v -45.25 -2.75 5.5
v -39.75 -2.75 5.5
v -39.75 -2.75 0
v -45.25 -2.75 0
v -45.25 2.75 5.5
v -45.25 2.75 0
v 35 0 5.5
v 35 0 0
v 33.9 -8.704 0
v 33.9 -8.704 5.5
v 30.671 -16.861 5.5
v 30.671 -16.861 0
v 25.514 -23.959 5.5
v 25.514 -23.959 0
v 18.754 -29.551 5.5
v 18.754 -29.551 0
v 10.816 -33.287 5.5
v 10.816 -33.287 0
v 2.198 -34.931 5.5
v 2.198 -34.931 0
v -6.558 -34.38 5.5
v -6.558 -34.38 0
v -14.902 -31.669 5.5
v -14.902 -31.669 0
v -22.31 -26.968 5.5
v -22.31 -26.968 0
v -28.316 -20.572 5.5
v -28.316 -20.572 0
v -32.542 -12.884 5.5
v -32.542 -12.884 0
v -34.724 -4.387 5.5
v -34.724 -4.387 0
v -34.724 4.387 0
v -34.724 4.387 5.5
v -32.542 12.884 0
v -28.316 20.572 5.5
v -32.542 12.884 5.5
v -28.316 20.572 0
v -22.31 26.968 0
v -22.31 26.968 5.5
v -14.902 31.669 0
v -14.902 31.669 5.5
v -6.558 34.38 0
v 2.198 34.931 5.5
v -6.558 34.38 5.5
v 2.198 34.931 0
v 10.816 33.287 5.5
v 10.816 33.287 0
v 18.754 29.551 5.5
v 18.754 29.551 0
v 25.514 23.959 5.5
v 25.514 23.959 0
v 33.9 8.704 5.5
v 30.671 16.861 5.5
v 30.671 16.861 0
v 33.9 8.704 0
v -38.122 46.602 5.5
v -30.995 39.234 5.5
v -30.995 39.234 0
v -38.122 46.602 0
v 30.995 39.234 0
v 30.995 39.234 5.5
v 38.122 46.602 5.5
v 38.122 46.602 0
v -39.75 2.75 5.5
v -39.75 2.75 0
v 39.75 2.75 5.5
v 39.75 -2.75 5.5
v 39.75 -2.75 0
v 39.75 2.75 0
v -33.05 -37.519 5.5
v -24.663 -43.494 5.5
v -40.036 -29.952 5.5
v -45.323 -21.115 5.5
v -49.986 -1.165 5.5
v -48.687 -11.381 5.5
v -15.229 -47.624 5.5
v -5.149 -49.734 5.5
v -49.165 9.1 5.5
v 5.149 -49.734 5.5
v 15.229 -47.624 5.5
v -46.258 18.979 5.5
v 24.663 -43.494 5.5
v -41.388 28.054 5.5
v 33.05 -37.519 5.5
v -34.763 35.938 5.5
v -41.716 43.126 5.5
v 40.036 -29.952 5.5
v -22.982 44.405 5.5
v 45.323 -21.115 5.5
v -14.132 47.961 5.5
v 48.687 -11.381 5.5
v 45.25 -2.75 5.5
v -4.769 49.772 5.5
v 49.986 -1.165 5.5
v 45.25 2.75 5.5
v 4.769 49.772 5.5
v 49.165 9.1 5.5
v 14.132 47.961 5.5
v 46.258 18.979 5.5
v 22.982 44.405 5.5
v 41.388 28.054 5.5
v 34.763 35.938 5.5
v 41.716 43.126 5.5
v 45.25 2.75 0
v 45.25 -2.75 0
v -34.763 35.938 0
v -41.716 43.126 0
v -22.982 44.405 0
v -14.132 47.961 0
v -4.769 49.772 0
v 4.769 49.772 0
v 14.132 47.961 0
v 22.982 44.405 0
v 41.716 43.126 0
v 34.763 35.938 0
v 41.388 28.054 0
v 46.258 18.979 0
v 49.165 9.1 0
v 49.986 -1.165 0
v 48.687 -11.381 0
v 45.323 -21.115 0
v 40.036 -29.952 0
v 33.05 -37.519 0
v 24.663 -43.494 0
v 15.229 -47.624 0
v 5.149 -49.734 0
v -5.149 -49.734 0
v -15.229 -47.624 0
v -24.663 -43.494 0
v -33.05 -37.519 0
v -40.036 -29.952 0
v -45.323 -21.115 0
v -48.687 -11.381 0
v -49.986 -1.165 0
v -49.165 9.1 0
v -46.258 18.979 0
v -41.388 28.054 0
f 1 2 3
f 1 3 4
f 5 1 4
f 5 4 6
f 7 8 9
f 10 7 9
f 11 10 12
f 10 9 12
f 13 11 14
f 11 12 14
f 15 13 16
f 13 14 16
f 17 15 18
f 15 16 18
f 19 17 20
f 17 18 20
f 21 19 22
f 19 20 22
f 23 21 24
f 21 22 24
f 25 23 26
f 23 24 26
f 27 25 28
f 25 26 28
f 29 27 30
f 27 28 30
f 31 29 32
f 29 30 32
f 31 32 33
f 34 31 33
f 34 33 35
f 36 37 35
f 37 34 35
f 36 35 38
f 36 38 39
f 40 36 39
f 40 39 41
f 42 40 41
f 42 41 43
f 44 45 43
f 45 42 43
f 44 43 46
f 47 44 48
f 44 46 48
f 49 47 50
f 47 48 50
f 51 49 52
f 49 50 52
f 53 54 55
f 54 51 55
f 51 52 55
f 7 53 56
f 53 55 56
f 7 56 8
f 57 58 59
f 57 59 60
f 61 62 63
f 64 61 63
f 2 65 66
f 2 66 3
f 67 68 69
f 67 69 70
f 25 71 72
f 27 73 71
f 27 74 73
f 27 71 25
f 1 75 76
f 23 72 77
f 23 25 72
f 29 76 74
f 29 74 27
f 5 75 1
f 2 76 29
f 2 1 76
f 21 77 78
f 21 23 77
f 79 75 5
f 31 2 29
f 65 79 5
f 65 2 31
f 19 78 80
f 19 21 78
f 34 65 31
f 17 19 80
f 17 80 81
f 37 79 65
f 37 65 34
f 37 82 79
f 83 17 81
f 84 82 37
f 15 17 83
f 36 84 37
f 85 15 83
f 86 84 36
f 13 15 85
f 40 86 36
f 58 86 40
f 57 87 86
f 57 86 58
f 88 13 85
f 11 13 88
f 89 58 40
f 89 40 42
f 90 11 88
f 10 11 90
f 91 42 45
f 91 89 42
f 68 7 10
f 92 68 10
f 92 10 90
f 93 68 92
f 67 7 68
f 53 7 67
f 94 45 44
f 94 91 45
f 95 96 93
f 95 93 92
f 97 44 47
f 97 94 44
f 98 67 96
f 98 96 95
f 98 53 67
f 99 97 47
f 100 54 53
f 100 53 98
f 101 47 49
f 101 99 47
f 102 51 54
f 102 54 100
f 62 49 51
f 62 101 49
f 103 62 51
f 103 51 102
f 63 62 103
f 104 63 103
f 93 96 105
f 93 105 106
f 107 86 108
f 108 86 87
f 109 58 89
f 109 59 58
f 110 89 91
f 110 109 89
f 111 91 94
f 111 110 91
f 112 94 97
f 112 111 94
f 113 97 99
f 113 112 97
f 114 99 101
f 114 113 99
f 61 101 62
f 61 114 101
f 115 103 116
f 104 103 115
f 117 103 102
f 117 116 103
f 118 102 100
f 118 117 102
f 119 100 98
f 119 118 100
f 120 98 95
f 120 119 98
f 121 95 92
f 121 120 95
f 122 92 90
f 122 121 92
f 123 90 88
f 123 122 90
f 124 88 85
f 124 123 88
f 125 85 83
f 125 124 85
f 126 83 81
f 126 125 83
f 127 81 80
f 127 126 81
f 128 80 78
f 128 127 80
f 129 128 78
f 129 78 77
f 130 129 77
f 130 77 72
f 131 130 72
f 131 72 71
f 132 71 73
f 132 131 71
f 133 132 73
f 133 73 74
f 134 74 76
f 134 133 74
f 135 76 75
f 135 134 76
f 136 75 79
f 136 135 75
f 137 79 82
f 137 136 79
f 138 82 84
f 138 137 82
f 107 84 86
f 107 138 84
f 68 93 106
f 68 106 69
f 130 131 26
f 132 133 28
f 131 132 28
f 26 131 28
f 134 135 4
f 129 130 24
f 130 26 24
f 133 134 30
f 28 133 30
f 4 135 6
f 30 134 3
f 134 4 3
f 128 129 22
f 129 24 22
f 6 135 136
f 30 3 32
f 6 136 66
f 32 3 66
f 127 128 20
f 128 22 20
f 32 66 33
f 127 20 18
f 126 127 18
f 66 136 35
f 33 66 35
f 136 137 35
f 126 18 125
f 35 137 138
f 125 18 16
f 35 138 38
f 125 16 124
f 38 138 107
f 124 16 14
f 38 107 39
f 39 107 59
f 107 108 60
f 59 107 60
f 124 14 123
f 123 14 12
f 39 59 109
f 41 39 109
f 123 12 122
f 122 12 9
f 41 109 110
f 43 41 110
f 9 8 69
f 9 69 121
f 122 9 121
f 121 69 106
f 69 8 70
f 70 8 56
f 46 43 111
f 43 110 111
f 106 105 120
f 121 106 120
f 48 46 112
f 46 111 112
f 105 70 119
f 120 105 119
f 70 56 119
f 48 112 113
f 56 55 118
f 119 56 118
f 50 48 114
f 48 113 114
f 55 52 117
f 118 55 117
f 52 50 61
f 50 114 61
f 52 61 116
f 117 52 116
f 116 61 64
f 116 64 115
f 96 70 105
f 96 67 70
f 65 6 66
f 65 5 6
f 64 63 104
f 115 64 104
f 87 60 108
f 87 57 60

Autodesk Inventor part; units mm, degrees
ref_plane "YZ Plane" through (0, 0, 0) normal (1, 0, 0) x (0, 1, 0)
ref_plane "XZ Plane" through (0, 0, 0) normal (0, 1, 0) x (-1, 0, 0)
ref_plane "XY Plane" through (0, 0, 0) normal (0, 0, 1) x (1, 0, 0)
sketch "Sketch1" plane through (0, 0, 0) normal (0, 0, 1) x (1, 0, 0)
  circle A0 centre (0, 0) radius 50
  circle A1 centre (0, 0) radius 35
  dimension "d0" = 100
  dimension "d1" = 70
extrude "Extrusion1" add sketch "Sketch1" along normal blind 5.5
sketch "Sketch4" plane through (0, 0, 5.5) normal (0, 0, 1) x (1, 0, 0)
  line L0 (39.75, 2.75) -> (45.25, 2.75)
  line L1 (45.25, 2.75) -> (45.25, -2.75)
  line L2 (45.25, -2.75) -> (39.75, -2.75)
  line L3 (39.75, -2.75) -> (39.75, 2.75)
  line L4 (-39.75, -2.75) -> (-45.25, -2.75)
  line L5 (-45.25, -2.75) -> (-45.25, 2.75)
  line L6 (-45.25, 2.75) -> (-39.75, 2.75)
  line L7 (-39.75, 2.75) -> (-39.75, -2.75)
  point P0 (0, 0)
  dimension "d13" = 5.5
  dimension "d14" = 5.5
  dimension "d17" = 360
extrude "Extrusion3" cut sketch "Sketch4" against normal blind 10
sketch "Sketch5" plane through (0, 0, 5.5) normal (0, 0, 1) x (1, 0, 0)
  circle A0 centre (0, 0) radius 50 projected
  line L0 (34.763, 35.938) -> (41.7155, 43.1255)
  line L1 (30.9949, 39.2341) -> (38.1218, 46.6018)
  line L2 (38.1218, 46.6018) -> (41.7155, 43.1255)
  line L3 (-34.763, 35.938) -> (-41.7155, 43.1255)
  line L4 (-30.9949, 39.2341) -> (-38.1218, 46.6018)
  line L5 (-38.1218, 46.6018) -> (-41.7155, 43.1255)
  arc A1 (-34.763, 35.938) -> (-30.9949, 39.2341) centre (-33.5607, 38.3654) ccw
  arc A2 (30.9949, 39.2341) -> (34.763, 35.938) centre (32.7963, 37.4916) ccw
  dimension "d21" = 10
  dimension "d22" = 5
extrude "Extrusion4" add sketch "Sketch5" against normal blind 5.5 contours A0 L1 L2 L0 | L3 L5 L4 A0 | A0 A1
properties part number "central"
